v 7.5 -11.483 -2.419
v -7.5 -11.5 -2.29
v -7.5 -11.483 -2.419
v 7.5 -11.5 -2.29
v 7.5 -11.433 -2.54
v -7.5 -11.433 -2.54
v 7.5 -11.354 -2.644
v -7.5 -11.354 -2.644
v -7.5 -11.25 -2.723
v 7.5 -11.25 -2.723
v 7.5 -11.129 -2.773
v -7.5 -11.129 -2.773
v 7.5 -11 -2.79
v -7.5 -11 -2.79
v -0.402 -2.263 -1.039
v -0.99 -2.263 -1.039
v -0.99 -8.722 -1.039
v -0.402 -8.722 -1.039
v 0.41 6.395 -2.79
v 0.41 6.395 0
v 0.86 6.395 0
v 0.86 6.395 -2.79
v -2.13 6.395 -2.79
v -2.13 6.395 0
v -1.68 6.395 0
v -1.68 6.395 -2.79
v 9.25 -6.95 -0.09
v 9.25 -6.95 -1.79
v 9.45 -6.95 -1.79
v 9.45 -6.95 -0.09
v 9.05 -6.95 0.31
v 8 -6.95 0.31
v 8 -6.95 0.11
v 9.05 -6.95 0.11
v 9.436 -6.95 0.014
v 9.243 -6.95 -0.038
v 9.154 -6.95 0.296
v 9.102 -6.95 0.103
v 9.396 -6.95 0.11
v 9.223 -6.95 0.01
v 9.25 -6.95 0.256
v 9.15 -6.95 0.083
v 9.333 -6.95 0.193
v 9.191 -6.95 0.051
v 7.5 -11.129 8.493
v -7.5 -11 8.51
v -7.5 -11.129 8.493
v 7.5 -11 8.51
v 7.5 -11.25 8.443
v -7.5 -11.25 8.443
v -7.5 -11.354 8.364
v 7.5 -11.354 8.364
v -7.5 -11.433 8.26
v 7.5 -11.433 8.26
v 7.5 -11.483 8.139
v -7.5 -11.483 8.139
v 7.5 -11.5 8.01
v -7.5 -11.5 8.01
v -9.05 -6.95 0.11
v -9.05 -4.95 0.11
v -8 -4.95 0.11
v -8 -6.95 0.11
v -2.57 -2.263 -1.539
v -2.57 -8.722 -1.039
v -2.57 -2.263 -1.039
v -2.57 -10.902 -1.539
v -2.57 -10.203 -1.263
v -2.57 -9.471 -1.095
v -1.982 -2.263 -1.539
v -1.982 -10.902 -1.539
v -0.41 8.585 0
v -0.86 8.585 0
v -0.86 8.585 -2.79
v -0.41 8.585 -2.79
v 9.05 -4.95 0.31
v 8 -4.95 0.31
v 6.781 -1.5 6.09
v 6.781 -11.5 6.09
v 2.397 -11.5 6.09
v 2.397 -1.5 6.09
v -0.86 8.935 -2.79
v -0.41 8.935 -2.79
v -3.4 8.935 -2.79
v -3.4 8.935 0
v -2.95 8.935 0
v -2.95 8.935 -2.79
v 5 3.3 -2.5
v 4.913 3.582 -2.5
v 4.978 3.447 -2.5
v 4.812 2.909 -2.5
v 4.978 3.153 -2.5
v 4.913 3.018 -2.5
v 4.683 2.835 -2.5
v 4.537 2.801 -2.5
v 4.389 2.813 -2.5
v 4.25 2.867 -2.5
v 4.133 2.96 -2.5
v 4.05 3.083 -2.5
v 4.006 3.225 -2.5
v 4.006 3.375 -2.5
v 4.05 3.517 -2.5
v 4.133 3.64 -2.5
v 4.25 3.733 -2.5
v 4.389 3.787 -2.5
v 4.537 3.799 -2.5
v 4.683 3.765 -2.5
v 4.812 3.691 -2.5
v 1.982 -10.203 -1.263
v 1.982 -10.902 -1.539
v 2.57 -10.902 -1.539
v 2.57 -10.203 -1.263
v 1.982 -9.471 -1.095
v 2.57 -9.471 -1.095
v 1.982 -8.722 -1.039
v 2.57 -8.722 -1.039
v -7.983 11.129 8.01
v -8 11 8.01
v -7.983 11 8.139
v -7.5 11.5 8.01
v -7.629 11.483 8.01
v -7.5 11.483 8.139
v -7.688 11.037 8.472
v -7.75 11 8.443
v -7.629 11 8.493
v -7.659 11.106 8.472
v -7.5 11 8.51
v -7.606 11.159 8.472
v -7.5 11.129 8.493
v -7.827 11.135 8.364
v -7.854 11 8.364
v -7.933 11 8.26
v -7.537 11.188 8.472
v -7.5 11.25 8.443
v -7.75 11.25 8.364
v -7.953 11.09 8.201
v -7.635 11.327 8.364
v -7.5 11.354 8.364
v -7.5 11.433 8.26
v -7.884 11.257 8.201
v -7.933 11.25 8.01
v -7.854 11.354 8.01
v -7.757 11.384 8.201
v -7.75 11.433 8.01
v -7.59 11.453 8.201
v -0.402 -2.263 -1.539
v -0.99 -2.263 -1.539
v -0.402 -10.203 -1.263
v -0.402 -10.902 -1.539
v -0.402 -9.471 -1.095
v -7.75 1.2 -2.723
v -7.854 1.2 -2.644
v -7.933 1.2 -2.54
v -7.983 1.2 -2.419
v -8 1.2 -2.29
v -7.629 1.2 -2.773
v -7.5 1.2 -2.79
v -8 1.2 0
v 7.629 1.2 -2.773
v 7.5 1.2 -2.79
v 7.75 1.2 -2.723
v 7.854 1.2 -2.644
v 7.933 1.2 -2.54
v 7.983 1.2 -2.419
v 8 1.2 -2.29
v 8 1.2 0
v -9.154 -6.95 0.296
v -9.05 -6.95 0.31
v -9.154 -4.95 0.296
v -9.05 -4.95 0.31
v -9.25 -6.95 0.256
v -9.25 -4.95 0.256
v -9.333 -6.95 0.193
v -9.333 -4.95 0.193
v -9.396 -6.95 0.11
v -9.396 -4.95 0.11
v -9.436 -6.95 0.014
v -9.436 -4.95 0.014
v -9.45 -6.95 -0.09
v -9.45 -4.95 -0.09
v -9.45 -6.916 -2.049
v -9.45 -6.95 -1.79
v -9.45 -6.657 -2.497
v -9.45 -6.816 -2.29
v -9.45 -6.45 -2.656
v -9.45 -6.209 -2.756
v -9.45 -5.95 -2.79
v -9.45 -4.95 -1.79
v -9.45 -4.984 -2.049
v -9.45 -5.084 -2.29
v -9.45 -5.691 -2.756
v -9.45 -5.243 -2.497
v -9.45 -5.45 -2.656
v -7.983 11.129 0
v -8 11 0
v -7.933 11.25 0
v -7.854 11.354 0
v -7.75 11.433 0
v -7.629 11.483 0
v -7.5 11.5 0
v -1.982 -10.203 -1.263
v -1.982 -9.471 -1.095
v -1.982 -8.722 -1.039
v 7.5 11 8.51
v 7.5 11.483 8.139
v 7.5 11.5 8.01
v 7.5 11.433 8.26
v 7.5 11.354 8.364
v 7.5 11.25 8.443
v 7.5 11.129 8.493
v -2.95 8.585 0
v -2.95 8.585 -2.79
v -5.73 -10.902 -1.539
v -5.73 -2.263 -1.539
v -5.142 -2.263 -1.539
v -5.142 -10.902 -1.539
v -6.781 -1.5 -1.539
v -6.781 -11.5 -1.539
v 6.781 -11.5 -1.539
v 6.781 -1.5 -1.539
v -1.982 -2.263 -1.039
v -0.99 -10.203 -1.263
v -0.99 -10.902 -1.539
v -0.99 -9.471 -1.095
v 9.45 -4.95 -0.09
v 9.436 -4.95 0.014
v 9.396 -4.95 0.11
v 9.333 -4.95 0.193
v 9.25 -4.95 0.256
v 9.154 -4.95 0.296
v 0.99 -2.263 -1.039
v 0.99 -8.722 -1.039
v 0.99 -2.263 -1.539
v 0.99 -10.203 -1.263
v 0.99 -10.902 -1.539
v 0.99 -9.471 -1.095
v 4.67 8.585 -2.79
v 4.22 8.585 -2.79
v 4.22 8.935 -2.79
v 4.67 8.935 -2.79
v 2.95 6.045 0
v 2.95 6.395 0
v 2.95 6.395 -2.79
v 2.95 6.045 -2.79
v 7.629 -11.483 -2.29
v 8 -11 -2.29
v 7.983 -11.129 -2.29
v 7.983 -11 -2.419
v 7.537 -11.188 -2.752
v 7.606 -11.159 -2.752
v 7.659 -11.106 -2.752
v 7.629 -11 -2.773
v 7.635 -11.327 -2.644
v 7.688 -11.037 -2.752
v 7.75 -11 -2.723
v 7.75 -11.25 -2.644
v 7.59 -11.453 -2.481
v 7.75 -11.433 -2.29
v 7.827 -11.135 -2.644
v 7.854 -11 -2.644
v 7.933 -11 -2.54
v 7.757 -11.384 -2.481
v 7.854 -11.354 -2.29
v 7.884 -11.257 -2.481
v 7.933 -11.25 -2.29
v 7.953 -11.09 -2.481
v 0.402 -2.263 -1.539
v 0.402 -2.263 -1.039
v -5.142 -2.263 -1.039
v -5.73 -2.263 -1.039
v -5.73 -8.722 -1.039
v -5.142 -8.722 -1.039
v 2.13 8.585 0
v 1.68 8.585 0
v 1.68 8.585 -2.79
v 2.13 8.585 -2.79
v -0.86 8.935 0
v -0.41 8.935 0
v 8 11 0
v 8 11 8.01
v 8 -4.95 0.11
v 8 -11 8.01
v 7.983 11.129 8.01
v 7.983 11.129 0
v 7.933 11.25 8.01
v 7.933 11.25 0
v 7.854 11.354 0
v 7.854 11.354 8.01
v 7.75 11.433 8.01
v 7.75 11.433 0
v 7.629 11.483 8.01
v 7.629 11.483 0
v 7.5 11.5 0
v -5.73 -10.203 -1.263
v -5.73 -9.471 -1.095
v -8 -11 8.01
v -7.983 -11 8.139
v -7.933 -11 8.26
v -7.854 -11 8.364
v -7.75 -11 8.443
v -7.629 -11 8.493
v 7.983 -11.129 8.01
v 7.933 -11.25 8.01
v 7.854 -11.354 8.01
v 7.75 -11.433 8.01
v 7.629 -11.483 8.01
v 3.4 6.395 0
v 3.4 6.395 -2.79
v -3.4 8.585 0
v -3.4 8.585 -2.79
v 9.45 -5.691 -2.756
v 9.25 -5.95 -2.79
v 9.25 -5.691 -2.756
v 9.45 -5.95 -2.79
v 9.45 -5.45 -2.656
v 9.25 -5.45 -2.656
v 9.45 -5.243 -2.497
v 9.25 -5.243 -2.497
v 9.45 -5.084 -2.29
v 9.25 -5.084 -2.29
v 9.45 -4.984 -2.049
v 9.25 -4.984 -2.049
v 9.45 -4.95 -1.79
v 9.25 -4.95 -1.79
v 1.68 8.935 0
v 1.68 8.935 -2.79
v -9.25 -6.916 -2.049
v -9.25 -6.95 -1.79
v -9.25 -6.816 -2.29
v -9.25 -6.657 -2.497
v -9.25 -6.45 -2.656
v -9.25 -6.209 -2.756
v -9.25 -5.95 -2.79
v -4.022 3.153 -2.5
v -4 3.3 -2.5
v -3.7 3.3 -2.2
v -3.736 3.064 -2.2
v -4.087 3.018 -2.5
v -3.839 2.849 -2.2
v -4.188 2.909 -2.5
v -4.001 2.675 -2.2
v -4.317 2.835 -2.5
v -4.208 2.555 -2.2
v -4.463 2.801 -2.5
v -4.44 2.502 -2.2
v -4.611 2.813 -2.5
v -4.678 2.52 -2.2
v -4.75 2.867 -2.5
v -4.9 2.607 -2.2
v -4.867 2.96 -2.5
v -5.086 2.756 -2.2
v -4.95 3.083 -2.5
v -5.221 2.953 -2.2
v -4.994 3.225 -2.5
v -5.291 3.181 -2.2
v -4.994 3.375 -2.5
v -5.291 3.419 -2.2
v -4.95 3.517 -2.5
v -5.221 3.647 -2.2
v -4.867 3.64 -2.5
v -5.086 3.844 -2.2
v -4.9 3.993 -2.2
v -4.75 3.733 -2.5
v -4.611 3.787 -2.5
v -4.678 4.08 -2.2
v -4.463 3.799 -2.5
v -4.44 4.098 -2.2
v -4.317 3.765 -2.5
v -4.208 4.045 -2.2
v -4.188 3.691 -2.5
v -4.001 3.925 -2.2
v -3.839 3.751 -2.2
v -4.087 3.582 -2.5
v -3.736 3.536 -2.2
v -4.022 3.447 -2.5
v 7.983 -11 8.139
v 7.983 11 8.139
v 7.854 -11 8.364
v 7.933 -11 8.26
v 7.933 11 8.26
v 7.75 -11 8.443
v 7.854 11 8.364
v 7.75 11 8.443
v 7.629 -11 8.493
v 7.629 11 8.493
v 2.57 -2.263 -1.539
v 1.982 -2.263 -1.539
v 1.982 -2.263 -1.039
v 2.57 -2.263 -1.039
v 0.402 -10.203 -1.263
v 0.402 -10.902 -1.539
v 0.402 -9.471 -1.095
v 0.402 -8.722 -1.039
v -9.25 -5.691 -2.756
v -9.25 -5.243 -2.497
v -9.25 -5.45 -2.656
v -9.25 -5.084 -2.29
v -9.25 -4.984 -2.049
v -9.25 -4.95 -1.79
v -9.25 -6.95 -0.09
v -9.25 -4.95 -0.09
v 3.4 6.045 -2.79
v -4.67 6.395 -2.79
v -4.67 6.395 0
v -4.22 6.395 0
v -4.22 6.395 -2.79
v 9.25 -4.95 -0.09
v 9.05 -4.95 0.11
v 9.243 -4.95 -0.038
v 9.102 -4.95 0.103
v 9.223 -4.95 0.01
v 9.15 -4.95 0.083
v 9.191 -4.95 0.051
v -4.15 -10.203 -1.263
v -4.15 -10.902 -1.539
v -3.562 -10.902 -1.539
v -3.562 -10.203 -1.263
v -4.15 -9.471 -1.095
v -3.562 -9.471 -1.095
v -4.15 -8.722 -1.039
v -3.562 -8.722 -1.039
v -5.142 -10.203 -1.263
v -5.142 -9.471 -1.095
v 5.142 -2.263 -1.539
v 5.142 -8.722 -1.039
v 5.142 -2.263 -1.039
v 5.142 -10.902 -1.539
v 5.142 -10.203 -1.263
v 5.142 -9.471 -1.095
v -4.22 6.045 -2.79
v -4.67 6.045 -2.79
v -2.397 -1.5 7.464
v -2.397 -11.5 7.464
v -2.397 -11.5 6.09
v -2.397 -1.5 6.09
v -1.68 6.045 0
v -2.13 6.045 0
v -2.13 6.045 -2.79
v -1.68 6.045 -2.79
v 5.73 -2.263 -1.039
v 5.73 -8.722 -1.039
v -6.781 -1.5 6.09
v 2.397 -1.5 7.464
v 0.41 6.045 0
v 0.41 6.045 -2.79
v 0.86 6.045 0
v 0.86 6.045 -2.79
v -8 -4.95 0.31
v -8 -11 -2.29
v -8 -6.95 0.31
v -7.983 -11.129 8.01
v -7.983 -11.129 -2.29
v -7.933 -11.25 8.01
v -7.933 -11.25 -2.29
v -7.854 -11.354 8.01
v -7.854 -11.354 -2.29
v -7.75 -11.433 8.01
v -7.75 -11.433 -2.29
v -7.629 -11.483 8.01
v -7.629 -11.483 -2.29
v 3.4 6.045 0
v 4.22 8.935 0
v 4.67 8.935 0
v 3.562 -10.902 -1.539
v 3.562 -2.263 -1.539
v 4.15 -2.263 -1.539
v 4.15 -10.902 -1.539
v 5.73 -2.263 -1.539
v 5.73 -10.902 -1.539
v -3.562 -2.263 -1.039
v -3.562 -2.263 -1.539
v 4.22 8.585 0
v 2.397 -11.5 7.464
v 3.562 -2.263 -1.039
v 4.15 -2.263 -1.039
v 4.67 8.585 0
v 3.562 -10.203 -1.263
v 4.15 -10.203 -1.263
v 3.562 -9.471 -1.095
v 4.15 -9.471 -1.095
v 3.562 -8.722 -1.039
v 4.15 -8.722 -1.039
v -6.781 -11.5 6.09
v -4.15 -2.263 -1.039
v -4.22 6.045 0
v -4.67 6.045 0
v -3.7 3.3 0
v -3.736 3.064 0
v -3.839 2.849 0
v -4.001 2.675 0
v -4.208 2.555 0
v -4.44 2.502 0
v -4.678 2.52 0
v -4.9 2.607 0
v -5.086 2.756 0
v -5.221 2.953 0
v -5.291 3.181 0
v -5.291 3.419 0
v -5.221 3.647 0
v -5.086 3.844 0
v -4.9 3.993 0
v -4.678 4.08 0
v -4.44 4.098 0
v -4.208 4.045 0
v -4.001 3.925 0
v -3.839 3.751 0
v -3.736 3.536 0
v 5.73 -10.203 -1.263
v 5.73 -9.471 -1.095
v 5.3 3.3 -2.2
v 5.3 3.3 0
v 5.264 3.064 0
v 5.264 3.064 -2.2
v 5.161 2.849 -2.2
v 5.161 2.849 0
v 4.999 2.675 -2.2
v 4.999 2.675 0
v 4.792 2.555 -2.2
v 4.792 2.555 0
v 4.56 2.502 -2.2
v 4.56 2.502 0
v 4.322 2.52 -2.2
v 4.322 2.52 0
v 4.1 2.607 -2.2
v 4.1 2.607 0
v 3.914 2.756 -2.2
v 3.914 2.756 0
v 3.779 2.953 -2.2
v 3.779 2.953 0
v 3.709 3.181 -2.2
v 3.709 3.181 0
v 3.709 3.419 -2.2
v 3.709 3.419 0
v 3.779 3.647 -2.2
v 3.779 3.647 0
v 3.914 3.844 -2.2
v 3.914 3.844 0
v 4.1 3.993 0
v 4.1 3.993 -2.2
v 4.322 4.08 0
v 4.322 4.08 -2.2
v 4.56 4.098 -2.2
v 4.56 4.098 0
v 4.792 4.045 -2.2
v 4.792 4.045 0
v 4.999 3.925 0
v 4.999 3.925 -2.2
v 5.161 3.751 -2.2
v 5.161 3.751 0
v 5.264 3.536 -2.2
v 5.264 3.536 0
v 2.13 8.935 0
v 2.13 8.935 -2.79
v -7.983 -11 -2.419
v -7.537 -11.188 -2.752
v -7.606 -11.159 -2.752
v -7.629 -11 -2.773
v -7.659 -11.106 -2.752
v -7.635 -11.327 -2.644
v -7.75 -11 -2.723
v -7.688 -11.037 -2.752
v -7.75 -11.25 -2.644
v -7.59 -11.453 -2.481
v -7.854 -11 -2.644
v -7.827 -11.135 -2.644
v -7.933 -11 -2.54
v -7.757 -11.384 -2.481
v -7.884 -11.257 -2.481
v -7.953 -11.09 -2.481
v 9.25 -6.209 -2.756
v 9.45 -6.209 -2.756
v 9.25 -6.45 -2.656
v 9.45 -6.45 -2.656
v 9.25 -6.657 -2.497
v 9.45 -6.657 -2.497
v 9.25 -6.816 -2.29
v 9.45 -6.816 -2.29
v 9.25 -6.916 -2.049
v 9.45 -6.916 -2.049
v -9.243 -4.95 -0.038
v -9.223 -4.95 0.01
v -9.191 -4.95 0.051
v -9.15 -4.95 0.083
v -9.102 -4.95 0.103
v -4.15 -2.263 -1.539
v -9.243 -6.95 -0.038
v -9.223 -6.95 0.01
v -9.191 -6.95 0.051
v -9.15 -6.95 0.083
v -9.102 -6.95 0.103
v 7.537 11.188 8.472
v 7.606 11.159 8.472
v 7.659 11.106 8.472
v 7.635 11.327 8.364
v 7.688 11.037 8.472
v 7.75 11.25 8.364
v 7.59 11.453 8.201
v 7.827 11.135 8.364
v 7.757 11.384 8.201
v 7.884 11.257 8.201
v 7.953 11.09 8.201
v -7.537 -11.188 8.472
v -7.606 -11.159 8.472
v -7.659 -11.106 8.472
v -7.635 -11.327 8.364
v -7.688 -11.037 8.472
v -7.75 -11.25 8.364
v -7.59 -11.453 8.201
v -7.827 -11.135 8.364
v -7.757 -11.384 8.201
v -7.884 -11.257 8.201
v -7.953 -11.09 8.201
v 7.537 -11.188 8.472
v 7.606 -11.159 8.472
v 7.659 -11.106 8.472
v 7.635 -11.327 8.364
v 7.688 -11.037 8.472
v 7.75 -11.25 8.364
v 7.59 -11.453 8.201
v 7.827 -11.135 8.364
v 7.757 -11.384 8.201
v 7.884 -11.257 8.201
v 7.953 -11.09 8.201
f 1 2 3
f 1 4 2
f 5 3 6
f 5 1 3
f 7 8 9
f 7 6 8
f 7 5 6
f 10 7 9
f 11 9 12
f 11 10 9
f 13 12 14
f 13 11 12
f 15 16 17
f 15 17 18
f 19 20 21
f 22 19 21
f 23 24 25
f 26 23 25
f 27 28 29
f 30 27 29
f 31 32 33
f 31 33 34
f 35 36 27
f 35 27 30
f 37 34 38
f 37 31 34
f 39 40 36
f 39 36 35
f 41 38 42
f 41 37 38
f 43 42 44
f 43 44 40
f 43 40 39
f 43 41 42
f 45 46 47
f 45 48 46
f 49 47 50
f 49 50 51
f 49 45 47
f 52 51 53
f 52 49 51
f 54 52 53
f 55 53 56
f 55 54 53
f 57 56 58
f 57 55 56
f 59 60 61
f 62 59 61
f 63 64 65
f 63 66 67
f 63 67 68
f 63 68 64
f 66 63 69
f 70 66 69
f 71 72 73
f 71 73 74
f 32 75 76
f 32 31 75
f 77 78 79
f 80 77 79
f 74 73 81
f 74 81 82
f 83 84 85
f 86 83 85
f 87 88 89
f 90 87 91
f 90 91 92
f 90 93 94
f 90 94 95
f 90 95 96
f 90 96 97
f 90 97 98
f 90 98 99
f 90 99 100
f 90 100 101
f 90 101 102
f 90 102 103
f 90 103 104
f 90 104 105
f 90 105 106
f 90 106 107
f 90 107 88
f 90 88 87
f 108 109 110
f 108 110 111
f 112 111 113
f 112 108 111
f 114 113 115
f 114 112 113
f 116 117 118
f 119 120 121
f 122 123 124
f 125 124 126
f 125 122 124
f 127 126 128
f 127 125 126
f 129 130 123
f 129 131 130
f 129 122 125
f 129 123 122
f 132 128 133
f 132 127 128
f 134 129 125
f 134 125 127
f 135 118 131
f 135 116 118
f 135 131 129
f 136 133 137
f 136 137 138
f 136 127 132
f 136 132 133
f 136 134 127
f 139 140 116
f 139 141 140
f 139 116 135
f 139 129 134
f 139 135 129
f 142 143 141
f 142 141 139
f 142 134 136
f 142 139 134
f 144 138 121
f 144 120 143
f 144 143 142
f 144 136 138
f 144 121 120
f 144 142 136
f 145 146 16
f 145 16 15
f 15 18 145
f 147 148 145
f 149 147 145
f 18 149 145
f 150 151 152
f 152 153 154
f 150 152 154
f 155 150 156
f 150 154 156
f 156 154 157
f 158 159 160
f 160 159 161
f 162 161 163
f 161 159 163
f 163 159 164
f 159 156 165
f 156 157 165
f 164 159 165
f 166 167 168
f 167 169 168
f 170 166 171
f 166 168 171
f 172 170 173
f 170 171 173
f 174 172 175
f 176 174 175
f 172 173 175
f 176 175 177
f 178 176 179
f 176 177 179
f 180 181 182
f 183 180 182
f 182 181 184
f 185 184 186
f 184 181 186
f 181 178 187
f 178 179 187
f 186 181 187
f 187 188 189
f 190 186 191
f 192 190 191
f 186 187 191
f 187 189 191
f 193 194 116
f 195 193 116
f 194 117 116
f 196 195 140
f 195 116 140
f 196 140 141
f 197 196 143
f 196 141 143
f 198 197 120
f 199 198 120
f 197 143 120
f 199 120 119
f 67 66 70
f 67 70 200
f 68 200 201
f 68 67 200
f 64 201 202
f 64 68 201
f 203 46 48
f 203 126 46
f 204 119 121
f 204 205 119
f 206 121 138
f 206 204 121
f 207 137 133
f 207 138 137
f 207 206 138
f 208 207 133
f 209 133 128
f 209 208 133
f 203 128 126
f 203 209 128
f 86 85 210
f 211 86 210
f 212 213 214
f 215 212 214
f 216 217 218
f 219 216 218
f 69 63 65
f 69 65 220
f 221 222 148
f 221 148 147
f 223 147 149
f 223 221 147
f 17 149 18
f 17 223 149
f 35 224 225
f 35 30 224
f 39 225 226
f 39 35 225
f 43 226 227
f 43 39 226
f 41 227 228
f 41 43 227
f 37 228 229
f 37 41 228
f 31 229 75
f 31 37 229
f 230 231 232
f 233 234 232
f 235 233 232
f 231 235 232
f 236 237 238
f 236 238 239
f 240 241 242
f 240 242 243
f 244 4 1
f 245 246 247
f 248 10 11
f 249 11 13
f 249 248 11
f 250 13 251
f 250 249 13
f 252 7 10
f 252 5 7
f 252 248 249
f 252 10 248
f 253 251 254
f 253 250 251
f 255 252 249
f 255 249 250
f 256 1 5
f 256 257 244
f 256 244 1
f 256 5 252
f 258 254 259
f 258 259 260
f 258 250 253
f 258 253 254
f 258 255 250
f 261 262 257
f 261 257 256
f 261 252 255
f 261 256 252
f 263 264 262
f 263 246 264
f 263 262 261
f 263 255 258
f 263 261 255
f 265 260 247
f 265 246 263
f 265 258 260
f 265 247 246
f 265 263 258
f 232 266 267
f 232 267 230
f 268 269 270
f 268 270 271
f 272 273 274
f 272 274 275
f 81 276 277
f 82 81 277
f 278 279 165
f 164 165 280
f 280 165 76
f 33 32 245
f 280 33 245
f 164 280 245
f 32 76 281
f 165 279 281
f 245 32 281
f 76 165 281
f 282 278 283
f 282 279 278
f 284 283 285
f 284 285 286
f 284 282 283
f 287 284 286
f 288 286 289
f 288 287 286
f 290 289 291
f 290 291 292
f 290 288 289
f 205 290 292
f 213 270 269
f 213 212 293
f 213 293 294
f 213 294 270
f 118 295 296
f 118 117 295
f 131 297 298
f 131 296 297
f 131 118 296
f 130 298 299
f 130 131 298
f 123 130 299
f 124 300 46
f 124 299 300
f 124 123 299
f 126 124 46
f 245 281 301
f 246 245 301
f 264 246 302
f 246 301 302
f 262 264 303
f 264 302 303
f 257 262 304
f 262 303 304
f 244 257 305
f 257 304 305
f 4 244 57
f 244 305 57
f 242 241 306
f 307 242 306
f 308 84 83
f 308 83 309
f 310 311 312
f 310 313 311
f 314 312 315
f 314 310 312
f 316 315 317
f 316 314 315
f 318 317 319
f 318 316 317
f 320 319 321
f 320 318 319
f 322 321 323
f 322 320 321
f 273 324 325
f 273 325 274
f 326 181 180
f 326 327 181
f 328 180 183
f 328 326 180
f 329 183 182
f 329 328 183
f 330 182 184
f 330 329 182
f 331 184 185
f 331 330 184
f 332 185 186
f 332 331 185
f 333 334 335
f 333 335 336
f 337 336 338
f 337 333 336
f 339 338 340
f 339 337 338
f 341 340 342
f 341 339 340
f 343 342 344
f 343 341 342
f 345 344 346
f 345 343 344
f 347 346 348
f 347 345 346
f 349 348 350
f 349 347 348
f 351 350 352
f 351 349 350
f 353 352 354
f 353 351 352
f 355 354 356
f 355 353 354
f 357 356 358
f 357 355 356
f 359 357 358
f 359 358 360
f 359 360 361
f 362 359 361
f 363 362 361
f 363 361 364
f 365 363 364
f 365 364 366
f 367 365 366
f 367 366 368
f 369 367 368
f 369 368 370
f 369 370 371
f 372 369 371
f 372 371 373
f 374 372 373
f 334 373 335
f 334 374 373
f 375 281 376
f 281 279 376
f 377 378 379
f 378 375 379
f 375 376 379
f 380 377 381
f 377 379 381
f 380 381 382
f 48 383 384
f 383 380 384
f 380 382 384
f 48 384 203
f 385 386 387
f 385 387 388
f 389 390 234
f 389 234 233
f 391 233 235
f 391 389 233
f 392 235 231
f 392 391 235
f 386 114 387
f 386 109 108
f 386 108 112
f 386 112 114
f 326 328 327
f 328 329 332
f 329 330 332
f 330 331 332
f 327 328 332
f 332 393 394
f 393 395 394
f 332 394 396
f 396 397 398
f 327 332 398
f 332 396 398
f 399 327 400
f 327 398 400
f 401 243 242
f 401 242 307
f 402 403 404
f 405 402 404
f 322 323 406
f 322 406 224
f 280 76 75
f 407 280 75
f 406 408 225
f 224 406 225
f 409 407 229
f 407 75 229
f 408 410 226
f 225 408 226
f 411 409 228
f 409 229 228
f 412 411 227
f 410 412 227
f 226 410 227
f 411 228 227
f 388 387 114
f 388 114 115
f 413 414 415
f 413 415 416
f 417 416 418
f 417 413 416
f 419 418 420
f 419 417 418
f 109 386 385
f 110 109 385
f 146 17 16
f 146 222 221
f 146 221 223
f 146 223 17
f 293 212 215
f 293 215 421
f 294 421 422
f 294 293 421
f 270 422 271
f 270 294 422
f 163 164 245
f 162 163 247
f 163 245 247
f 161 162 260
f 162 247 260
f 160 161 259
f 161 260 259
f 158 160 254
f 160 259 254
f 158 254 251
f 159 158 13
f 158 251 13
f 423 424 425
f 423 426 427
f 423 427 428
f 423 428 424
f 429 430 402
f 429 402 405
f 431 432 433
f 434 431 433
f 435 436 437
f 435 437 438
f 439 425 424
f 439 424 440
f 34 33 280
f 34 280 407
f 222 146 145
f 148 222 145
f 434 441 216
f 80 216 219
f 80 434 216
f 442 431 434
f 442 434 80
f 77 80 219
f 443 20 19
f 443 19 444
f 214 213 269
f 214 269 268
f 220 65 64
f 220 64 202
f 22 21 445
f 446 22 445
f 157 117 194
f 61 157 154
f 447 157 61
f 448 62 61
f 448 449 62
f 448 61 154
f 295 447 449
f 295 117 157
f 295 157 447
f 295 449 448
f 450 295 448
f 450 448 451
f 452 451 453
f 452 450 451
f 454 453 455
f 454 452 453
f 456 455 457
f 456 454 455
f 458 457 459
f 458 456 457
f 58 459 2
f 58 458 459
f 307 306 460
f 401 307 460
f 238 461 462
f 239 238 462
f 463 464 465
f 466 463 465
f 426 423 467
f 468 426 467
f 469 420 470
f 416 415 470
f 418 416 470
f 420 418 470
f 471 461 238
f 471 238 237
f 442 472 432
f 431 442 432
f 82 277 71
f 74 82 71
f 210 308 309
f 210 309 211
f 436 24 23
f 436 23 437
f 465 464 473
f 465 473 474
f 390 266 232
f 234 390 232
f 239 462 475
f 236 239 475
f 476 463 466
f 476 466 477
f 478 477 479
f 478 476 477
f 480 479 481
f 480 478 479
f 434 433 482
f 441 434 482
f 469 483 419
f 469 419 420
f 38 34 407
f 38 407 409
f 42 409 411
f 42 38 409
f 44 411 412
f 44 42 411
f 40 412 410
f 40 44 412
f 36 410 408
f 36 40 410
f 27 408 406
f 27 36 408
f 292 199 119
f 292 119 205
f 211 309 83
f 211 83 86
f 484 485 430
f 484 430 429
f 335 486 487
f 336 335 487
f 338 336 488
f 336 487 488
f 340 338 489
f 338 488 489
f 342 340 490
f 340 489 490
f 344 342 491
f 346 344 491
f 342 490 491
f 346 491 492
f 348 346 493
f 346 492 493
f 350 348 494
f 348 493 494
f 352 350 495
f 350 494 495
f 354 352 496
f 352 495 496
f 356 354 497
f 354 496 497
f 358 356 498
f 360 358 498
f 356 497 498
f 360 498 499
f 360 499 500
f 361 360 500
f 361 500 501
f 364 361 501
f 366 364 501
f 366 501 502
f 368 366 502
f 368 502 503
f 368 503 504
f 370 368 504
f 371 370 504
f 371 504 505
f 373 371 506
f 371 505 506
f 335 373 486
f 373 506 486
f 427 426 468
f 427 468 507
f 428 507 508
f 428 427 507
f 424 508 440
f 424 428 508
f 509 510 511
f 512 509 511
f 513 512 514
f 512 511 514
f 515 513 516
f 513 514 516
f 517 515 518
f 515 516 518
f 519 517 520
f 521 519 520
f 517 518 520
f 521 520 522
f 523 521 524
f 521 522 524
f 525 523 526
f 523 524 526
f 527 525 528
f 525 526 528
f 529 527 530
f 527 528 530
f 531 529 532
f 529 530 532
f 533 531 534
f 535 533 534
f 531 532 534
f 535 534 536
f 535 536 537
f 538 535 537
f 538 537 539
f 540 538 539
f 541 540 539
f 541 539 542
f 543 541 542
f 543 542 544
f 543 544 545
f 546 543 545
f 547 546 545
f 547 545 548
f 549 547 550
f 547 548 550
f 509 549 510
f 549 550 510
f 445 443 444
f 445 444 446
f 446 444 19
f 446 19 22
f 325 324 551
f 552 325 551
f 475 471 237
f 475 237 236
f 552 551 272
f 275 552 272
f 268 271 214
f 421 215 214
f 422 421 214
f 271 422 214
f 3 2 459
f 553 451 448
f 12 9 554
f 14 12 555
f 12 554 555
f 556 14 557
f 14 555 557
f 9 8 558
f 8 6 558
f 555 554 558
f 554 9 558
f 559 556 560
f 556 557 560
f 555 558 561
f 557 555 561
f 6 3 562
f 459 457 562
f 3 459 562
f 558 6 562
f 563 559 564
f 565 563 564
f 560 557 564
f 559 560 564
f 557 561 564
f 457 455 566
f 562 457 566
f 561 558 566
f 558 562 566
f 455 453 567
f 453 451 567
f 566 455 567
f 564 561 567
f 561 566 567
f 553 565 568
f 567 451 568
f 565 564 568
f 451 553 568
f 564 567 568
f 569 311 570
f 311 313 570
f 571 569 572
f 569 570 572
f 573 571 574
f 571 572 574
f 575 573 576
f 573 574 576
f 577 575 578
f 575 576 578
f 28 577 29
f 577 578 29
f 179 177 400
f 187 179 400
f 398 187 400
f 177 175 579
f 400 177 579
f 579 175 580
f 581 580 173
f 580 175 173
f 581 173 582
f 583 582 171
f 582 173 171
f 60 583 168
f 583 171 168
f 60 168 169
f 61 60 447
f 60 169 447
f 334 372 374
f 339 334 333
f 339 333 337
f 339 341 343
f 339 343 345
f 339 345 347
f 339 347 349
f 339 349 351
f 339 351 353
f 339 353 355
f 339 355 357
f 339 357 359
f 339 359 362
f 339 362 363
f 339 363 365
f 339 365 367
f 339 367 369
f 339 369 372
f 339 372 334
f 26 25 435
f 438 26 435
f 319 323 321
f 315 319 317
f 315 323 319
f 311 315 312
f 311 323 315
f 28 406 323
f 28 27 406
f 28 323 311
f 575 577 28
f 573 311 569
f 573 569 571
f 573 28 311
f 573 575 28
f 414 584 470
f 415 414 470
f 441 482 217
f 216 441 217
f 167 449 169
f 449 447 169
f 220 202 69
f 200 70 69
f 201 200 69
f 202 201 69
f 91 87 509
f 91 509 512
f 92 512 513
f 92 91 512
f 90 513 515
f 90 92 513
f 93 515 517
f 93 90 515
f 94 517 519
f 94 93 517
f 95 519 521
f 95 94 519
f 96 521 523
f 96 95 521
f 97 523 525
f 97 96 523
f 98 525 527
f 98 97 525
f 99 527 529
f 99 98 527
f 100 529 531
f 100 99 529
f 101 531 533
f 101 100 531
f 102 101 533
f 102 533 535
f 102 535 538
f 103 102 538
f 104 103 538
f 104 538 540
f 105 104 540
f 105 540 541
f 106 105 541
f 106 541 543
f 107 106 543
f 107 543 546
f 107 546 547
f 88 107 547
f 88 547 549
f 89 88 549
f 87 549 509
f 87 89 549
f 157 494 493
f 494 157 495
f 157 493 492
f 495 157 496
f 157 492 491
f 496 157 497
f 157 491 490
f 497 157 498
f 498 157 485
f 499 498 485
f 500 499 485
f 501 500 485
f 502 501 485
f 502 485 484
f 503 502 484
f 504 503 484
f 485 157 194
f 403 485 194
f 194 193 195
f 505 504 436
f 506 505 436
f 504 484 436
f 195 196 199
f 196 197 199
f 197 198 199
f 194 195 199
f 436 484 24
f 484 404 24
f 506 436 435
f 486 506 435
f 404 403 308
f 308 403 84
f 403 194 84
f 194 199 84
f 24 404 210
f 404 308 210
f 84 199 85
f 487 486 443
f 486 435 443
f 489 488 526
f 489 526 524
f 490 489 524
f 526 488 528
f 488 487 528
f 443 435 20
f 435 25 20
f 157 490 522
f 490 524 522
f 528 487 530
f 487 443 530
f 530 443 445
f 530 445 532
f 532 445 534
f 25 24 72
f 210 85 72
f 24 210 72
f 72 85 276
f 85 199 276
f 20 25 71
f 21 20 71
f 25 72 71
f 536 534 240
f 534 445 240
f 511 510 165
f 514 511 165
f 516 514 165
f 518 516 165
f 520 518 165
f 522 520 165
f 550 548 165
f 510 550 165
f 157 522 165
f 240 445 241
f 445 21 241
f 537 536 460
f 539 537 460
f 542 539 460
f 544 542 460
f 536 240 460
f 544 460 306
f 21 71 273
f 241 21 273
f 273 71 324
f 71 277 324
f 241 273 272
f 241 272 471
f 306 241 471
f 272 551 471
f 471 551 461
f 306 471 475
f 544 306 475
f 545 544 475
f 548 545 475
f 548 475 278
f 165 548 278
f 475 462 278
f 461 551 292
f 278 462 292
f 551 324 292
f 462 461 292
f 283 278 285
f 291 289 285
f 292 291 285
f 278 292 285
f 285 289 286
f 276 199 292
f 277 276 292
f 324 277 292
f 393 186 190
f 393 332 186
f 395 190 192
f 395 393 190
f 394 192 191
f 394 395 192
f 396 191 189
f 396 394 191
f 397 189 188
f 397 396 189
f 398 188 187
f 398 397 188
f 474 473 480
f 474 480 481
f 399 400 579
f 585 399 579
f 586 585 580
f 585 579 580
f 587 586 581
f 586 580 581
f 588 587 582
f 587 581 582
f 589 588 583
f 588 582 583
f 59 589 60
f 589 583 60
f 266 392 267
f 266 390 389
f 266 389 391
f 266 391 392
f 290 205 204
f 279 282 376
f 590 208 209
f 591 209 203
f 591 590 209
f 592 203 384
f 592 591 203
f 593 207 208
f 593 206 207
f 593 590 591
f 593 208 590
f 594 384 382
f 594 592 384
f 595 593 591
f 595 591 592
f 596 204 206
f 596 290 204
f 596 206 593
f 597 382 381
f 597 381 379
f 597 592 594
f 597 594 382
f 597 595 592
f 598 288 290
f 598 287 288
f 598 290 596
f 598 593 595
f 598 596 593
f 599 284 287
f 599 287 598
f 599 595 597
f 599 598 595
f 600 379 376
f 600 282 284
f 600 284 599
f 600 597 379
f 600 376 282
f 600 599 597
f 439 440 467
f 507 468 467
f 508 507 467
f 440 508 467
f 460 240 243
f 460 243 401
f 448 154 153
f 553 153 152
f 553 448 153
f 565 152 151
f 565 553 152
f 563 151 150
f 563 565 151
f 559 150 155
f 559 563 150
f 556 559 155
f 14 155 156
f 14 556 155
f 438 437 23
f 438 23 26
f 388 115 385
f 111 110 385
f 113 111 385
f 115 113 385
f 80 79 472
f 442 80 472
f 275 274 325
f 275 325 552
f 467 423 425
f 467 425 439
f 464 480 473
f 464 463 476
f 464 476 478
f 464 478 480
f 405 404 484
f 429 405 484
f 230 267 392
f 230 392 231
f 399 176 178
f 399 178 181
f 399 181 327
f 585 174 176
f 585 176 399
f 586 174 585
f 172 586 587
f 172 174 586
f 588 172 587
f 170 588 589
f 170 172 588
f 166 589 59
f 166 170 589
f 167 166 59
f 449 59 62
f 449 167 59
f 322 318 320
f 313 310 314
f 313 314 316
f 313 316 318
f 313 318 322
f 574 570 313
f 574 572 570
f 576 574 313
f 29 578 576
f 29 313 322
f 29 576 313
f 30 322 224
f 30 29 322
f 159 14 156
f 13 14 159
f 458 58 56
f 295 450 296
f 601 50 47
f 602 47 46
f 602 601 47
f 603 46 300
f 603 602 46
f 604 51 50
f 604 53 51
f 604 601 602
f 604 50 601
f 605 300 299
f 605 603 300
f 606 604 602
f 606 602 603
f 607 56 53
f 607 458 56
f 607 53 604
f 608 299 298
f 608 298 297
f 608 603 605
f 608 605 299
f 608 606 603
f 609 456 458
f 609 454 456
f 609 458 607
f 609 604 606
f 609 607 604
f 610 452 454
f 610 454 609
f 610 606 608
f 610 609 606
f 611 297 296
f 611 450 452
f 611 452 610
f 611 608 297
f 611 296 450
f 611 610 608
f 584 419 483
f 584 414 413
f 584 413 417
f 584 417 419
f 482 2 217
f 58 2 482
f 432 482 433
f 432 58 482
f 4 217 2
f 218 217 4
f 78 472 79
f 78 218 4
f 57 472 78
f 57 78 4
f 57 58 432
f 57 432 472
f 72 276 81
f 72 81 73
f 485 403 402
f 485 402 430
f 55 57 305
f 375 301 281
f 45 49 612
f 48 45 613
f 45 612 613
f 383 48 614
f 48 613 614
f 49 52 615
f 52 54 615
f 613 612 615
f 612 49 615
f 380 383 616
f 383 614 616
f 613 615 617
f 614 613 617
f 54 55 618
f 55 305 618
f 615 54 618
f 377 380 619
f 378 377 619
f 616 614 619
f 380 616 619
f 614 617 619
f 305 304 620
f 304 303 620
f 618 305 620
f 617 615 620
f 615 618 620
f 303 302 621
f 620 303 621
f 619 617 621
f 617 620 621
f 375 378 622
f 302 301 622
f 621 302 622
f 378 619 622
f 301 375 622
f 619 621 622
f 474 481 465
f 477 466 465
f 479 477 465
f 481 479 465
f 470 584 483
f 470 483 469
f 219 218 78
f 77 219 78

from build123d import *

# Parameters (mm, degrees)
F0_W           = 16
F0_H           = 23
F1_DEPTH       = 8.51
F2_W           = 16
F2_H           = 12.7
F3_DEPTH       = 2.79
F4_R           = 0.5
F5_R           = 0.8
F6_DEPTH       = 2.5
F7_SIZE        = 0.3
F9_DEPTH       = 10
F10_W          = 0.5874776107
F10_H          = 8.6386585608
F11_DEPTH      = 0.5
F12_T1_DEPTH   = 11.4847249695
F12_2_T1_DEPTH = 11.4847249695
F12_3_T1_DEPTH = 11.4847249695
F12_4_T1_DEPTH = 11.4847249695
F12_5_T1_DEPTH = 11.4847249695
F12_6_T1_DEPTH = 11.4847249695
F12_7_T1_DEPTH = 11.4847249695
F12_8_T1_DEPTH = 11.4847249695
F13_W          = 0.45
F13_H          = 0.35
F14_DEPTH      = 2.79
F17_DEPTH      = 1
F17_DEPTH_BACK = 1
F18_R          = 0.99999


# Not quite as in the source:
# - a fillet or chamfer that OpenCascade refuses, or shapes differently, is made with other operations: its cross-section is extruded or revolved along the edge and cut away or added
# - a fillet or chamfer is up to 0.001 mm smaller than in the source, because OpenCascade refuses the exact size


with BuildPart() as f1:
    # F0 (on Top) → F1 (new body)
    with BuildSketch(Plane.XY):
        Rectangle(F0_W, F0_H)
    extrude(amount=F1_DEPTH)

    # F2 (on face) → F3 (join)
    with BuildSketch(Plane(origin=(0, 0, 0), x_dir=(1, 0, 0), z_dir=(0, 0, -1))):
        with Locations((0, 5.15)):
            Rectangle(F2_W, F2_H)
    extrude(amount=F3_DEPTH)

    # F4
    f4_edges = [f1.edges().sort_by_distance(p)[0] for p in [
        (-8, -11.5, 2.86),
        (8, -11.5, 2.86),
        (8, 11.5, 4.255),
        (-8, 11.5, 4.255),
        (0, -11.5, 8.51),
        (-8, 0, 8.51),
        (0, 11.5, 8.51),
        (8, 0, 8.51),
        (0, -11.5, -2.79),
        (-8, -5.15, -2.79),
        (8, -5.15, -2.79),
    ]]
    fillet(f4_edges, radius=F4_R)

    # F5 (on face) → F6 (join)
    with BuildSketch(Plane(origin=(0, 0, 0), x_dir=(1, 0, 0), z_dir=(0, 0, -1))):
        with Locations((4.5, -3.3)):
            Circle(F5_R)
        with Locations((-4.5, -3.3)):
            Circle(F5_R)
    extrude(amount=F6_DEPTH)

    # F7
    f7_edges = [f1.edges().sort_by_distance(p)[0] for p in [
        (3.7, 3.3, -2.5),
        (-5.3, 3.3, -2.5),
    ]]
    chamfer(f7_edges, length=F7_SIZE)

    # F8 (on face) → F9 (cut)
    with BuildSketch(Plane.XZ.offset(11.5)):
        Polygon((2.3968075402, 7.4636251666), (0, 7.4636251666), (-2.3968075402, 7.4636251666), (-2.3968075402, 6.0898447409), (-6.7812129855, 6.0898447409), (-6.7812129855, -1.5390195185), (0, -1.5390195185), (6.7812129855, -1.5390195185), (6.7812129855, 6.0898447409), (2.3968075402, 6.0898447409), align=None)
    extrude(amount=-F9_DEPTH, mode=Mode.SUBTRACT)

    # F13 (on face) → F14 (join)
    with BuildSketch(Plane(origin=(0, 0, 0), x_dir=(1, 0, 0), z_dir=(0, 0, -1))):
        with Locations((4.445, -8.76)):
            Rectangle(F13_W, F13_H)
        with Locations((1.905, -8.76)):
            Rectangle(F13_W, F13_H)
        with Locations((-0.635, -8.76)):
            Rectangle(F13_W, F13_H)
        with Locations((-3.175, -8.76)):
            Rectangle(F13_W, F13_H)
        with Locations((3.175, -6.22)):
            Rectangle(F13_W, F13_H)
        with Locations((0.635, -6.22)):
            Rectangle(F13_W, F13_H)
        with Locations((-1.905, -6.22)):
            Rectangle(F13_W, F13_H)
        with Locations((-4.445, -6.22)):
            Rectangle(F13_W, F13_H)
    extrude(amount=F14_DEPTH)

    # F16 (on offset) → F17 (join, two sides)
    with BuildSketch(Plane.XZ.offset(5.95)) as f17_sk:
        with BuildLine():
            Line((9.05, 0.31), (8, 0.31))
            Line((8, 0.31), (8, 0.11))
            Line((8, 0.11), (9.05, 0.11))
            ThreePointArc((9.05, 0.11), (9.1914213562, 0.0514213562), (9.25, -0.09))
            Line((9.25, -0.09), (9.25, -2.79))
            Line((9.25, -2.79), (9.45, -2.79))
            Line((9.45, -2.79), (9.45, -0.09))
            ThreePointArc((9.45, -0.09), (9.3328427125, 0.1928427125), (9.05, 0.31))
        make_face()
        with BuildLine():
            Line((-9.45, -2.79), (-9.25, -2.79))
            Line((-9.25, -2.79), (-9.25, -0.09))
            ThreePointArc((-9.25, -0.09), (-9.1914213562, 0.0514213562), (-9.05, 0.11))
            Line((-9.05, 0.11), (-8, 0.11))
            Line((-8, 0.11), (-8, 0.31))
            Line((-8, 0.31), (-9.05, 0.31))
            ThreePointArc((-9.05, 0.31), (-9.3328427125, 0.1928427125), (-9.45, -0.09))
            Line((-9.45, -0.09), (-9.45, -2.79))
        make_face()
    extrude(amount=F17_DEPTH)
    extrude(f17_sk.sketch, amount=-F17_DEPTH_BACK)

    # F18 (radius 1 in the source; OpenCascade refuses exactly that, so slightly less here)
    f18_edges = [f1.edges().sort_by_distance(p)[0] for p in [
        (9.35, -6.95, -2.79),
        (9.35, -4.95, -2.79),
        (-9.35, -6.95, -2.79),
        (-9.35, -4.95, -2.79),
    ]]
    fillet(f18_edges, radius=F18_R)


with BuildPart() as f11:
    # F10 (on face) → F11 (new body)
    with BuildSketch(Plane.XY.offset(-1.5390195185)):
        with Locations((0.6958528975, -6.5825465135)):
            Rectangle(F10_W, F10_H)
    extrude(amount=F11_DEPTH)

    # F12: fillet of radius 5 on 1 edges, made by hand

    # F12_s2 → F12_t1 (cut)
    with BuildSketch(Plane.YZ.offset(-5.0465095873)):
        with BuildLine():
            ThreePointArc((-10.9018757939, -1.5390195185), (-9.8404603109, -1.1656223461), (-8.7224263222, -1.0390195185))
            Line((-8.7224263222, -1.0390195185), (-10.9018757939, -1.0390195185))
            Line((-10.9018757939, -1.0390195185), (-10.9018757939, -1.5390195185))
        make_face()
    extrude(amount=F12_T1_DEPTH, mode=Mode.SUBTRACT)


with BuildPart() as f11b:
    # F10 (on face) → F11, piece 2 (new body)
    with BuildSketch(Plane.XY.offset(-1.5390195185)):
        with Locations((2.2758528975, -6.5825465135)):
            Rectangle(F10_W, F10_H)
    extrude(amount=F11_DEPTH)

    # F12#2: fillet of radius 5 on 1 edges, made by hand

    # F12_2_s2 → F12_2_t1 (cut)
    with BuildSketch(Plane.YZ.offset(-3.4665095873)):
        with BuildLine():
            ThreePointArc((-10.9018757939, -1.5390195185), (-9.8404603109, -1.1656223461), (-8.7224263222, -1.0390195185))
            Line((-8.7224263222, -1.0390195185), (-10.9018757939, -1.0390195185))
            Line((-10.9018757939, -1.0390195185), (-10.9018757939, -1.5390195185))
        make_face()
    extrude(amount=F12_2_T1_DEPTH, mode=Mode.SUBTRACT)


with BuildPart() as f11c:
    # F10 (on face) → F11, piece 3 (new body)
    with BuildSketch(Plane.XY.offset(-1.5390195185)):
        with Locations((3.8558528975, -6.5825465135)):
            Rectangle(F10_W, F10_H)
    extrude(amount=F11_DEPTH)

    # F12#3: fillet of radius 5 on 1 edges, made by hand

    # F12_3_s2 → F12_3_t1 (cut)
    with BuildSketch(Plane.YZ.offset(-1.8865095873)):
        with BuildLine():
            ThreePointArc((-10.9018757939, -1.5390195185), (-9.8404603109, -1.1656223461), (-8.7224263222, -1.0390195185))
            Line((-8.7224263222, -1.0390195185), (-10.9018757939, -1.0390195185))
            Line((-10.9018757939, -1.0390195185), (-10.9018757939, -1.5390195185))
        make_face()
    extrude(amount=F12_3_T1_DEPTH, mode=Mode.SUBTRACT)


with BuildPart() as f11d:
    # F10 (on face) → F11, piece 4 (new body)
    with BuildSketch(Plane.XY.offset(-1.5390195185)):
        with Locations((5.4358528975, -6.5825465135)):
            Rectangle(F10_W, F10_H)
    extrude(amount=F11_DEPTH)

    # F12#4: fillet of radius 5 on 1 edges, made by hand

    # F12_4_s2 → F12_4_t1 (cut)
    with BuildSketch(Plane.YZ.offset(-0.3065095873)):
        with BuildLine():
            ThreePointArc((-10.9018757939, -1.5390195185), (-9.8404603109, -1.1656223461), (-8.7224263222, -1.0390195185))
            Line((-8.7224263222, -1.0390195185), (-10.9018757939, -1.0390195185))
            Line((-10.9018757939, -1.0390195185), (-10.9018757939, -1.5390195185))
        make_face()
    extrude(amount=F12_4_T1_DEPTH, mode=Mode.SUBTRACT)


with BuildPart() as f11e:
    # F10 (on face) → F11, piece 5 (new body)
    with BuildSketch(Plane.XY.offset(-1.5390195185)):
        with Locations((-0.6958528975, -6.5825465135)):
            Rectangle(F10_W, F10_H)
    extrude(amount=F11_DEPTH)

    # F12#5: fillet of radius 5 on 1 edges, made by hand

    # F12_5_s2 → F12_5_t1 (cut)
    with BuildSketch(Plane.YZ.offset(-6.4382153822)):
        with BuildLine():
            ThreePointArc((-10.9018757939, -1.5390195185), (-9.8404603109, -1.1656223461), (-8.7224263222, -1.0390195185))
            Line((-8.7224263222, -1.0390195185), (-10.9018757939, -1.0390195185))
            Line((-10.9018757939, -1.0390195185), (-10.9018757939, -1.5390195185))
        make_face()
    extrude(amount=F12_5_T1_DEPTH, mode=Mode.SUBTRACT)


with BuildPart() as f11f:
    # F10 (on face) → F11, piece 6 (new body)
    with BuildSketch(Plane.XY.offset(-1.5390195185)):
        with Locations((-3.8558528975, -6.5825465135)):
            Rectangle(F10_W, F10_H)
    extrude(amount=F11_DEPTH)

    # F12#6: fillet of radius 5 on 1 edges, made by hand

    # F12_6_s2 → F12_6_t1 (cut)
    with BuildSketch(Plane.YZ.offset(-9.5982153822)):
        with BuildLine():
            ThreePointArc((-10.9018757939, -1.5390195185), (-9.8404603109, -1.1656223461), (-8.7224263222, -1.0390195185))
            Line((-8.7224263222, -1.0390195185), (-10.9018757939, -1.0390195185))
            Line((-10.9018757939, -1.0390195185), (-10.9018757939, -1.5390195185))
        make_face()
    extrude(amount=F12_6_T1_DEPTH, mode=Mode.SUBTRACT)


with BuildPart() as f11g:
    # F10 (on face) → F11, piece 7 (new body)
    with BuildSketch(Plane.XY.offset(-1.5390195185)):
        with Locations((-2.2758528975, -6.5825465135)):
            Rectangle(F10_W, F10_H)
    extrude(amount=F11_DEPTH)

    # F12#7: fillet of radius 5 on 1 edges, made by hand

    # F12_7_s2 → F12_7_t1 (cut)
    with BuildSketch(Plane.YZ.offset(-8.0182153822)):
        with BuildLine():
            ThreePointArc((-10.9018757939, -1.5390195185), (-9.8404603109, -1.1656223461), (-8.7224263222, -1.0390195185))
            Line((-8.7224263222, -1.0390195185), (-10.9018757939, -1.0390195185))
            Line((-10.9018757939, -1.0390195185), (-10.9018757939, -1.5390195185))
        make_face()
    extrude(amount=F12_7_T1_DEPTH, mode=Mode.SUBTRACT)


with BuildPart() as f11h:
    # F10 (on face) → F11, piece 8 (new body)
    with BuildSketch(Plane.XY.offset(-1.5390195185)):
        with Locations((-5.4358528975, -6.5825465135)):
            Rectangle(F10_W, F10_H)
    extrude(amount=F11_DEPTH)

    # F12#8: fillet of radius 5 on 1 edges, made by hand

    # F12_8_s2 → F12_8_t1 (cut)
    with BuildSketch(Plane.YZ.offset(-11.1782153822)):
        with BuildLine():
            ThreePointArc((-10.9018757939, -1.5390195185), (-9.8404603109, -1.1656223461), (-8.7224263222, -1.0390195185))
            Line((-8.7224263222, -1.0390195185), (-10.9018757939, -1.0390195185))
            Line((-10.9018757939, -1.0390195185), (-10.9018757939, -1.5390195185))
        make_face()
    extrude(amount=F12_8_T1_DEPTH, mode=Mode.SUBTRACT)


solid = Compound([f1.part, f11.part, f11b.part, f11c.part, f11d.part, f11e.part, f11f.part, f11g.part, f11h.part])
